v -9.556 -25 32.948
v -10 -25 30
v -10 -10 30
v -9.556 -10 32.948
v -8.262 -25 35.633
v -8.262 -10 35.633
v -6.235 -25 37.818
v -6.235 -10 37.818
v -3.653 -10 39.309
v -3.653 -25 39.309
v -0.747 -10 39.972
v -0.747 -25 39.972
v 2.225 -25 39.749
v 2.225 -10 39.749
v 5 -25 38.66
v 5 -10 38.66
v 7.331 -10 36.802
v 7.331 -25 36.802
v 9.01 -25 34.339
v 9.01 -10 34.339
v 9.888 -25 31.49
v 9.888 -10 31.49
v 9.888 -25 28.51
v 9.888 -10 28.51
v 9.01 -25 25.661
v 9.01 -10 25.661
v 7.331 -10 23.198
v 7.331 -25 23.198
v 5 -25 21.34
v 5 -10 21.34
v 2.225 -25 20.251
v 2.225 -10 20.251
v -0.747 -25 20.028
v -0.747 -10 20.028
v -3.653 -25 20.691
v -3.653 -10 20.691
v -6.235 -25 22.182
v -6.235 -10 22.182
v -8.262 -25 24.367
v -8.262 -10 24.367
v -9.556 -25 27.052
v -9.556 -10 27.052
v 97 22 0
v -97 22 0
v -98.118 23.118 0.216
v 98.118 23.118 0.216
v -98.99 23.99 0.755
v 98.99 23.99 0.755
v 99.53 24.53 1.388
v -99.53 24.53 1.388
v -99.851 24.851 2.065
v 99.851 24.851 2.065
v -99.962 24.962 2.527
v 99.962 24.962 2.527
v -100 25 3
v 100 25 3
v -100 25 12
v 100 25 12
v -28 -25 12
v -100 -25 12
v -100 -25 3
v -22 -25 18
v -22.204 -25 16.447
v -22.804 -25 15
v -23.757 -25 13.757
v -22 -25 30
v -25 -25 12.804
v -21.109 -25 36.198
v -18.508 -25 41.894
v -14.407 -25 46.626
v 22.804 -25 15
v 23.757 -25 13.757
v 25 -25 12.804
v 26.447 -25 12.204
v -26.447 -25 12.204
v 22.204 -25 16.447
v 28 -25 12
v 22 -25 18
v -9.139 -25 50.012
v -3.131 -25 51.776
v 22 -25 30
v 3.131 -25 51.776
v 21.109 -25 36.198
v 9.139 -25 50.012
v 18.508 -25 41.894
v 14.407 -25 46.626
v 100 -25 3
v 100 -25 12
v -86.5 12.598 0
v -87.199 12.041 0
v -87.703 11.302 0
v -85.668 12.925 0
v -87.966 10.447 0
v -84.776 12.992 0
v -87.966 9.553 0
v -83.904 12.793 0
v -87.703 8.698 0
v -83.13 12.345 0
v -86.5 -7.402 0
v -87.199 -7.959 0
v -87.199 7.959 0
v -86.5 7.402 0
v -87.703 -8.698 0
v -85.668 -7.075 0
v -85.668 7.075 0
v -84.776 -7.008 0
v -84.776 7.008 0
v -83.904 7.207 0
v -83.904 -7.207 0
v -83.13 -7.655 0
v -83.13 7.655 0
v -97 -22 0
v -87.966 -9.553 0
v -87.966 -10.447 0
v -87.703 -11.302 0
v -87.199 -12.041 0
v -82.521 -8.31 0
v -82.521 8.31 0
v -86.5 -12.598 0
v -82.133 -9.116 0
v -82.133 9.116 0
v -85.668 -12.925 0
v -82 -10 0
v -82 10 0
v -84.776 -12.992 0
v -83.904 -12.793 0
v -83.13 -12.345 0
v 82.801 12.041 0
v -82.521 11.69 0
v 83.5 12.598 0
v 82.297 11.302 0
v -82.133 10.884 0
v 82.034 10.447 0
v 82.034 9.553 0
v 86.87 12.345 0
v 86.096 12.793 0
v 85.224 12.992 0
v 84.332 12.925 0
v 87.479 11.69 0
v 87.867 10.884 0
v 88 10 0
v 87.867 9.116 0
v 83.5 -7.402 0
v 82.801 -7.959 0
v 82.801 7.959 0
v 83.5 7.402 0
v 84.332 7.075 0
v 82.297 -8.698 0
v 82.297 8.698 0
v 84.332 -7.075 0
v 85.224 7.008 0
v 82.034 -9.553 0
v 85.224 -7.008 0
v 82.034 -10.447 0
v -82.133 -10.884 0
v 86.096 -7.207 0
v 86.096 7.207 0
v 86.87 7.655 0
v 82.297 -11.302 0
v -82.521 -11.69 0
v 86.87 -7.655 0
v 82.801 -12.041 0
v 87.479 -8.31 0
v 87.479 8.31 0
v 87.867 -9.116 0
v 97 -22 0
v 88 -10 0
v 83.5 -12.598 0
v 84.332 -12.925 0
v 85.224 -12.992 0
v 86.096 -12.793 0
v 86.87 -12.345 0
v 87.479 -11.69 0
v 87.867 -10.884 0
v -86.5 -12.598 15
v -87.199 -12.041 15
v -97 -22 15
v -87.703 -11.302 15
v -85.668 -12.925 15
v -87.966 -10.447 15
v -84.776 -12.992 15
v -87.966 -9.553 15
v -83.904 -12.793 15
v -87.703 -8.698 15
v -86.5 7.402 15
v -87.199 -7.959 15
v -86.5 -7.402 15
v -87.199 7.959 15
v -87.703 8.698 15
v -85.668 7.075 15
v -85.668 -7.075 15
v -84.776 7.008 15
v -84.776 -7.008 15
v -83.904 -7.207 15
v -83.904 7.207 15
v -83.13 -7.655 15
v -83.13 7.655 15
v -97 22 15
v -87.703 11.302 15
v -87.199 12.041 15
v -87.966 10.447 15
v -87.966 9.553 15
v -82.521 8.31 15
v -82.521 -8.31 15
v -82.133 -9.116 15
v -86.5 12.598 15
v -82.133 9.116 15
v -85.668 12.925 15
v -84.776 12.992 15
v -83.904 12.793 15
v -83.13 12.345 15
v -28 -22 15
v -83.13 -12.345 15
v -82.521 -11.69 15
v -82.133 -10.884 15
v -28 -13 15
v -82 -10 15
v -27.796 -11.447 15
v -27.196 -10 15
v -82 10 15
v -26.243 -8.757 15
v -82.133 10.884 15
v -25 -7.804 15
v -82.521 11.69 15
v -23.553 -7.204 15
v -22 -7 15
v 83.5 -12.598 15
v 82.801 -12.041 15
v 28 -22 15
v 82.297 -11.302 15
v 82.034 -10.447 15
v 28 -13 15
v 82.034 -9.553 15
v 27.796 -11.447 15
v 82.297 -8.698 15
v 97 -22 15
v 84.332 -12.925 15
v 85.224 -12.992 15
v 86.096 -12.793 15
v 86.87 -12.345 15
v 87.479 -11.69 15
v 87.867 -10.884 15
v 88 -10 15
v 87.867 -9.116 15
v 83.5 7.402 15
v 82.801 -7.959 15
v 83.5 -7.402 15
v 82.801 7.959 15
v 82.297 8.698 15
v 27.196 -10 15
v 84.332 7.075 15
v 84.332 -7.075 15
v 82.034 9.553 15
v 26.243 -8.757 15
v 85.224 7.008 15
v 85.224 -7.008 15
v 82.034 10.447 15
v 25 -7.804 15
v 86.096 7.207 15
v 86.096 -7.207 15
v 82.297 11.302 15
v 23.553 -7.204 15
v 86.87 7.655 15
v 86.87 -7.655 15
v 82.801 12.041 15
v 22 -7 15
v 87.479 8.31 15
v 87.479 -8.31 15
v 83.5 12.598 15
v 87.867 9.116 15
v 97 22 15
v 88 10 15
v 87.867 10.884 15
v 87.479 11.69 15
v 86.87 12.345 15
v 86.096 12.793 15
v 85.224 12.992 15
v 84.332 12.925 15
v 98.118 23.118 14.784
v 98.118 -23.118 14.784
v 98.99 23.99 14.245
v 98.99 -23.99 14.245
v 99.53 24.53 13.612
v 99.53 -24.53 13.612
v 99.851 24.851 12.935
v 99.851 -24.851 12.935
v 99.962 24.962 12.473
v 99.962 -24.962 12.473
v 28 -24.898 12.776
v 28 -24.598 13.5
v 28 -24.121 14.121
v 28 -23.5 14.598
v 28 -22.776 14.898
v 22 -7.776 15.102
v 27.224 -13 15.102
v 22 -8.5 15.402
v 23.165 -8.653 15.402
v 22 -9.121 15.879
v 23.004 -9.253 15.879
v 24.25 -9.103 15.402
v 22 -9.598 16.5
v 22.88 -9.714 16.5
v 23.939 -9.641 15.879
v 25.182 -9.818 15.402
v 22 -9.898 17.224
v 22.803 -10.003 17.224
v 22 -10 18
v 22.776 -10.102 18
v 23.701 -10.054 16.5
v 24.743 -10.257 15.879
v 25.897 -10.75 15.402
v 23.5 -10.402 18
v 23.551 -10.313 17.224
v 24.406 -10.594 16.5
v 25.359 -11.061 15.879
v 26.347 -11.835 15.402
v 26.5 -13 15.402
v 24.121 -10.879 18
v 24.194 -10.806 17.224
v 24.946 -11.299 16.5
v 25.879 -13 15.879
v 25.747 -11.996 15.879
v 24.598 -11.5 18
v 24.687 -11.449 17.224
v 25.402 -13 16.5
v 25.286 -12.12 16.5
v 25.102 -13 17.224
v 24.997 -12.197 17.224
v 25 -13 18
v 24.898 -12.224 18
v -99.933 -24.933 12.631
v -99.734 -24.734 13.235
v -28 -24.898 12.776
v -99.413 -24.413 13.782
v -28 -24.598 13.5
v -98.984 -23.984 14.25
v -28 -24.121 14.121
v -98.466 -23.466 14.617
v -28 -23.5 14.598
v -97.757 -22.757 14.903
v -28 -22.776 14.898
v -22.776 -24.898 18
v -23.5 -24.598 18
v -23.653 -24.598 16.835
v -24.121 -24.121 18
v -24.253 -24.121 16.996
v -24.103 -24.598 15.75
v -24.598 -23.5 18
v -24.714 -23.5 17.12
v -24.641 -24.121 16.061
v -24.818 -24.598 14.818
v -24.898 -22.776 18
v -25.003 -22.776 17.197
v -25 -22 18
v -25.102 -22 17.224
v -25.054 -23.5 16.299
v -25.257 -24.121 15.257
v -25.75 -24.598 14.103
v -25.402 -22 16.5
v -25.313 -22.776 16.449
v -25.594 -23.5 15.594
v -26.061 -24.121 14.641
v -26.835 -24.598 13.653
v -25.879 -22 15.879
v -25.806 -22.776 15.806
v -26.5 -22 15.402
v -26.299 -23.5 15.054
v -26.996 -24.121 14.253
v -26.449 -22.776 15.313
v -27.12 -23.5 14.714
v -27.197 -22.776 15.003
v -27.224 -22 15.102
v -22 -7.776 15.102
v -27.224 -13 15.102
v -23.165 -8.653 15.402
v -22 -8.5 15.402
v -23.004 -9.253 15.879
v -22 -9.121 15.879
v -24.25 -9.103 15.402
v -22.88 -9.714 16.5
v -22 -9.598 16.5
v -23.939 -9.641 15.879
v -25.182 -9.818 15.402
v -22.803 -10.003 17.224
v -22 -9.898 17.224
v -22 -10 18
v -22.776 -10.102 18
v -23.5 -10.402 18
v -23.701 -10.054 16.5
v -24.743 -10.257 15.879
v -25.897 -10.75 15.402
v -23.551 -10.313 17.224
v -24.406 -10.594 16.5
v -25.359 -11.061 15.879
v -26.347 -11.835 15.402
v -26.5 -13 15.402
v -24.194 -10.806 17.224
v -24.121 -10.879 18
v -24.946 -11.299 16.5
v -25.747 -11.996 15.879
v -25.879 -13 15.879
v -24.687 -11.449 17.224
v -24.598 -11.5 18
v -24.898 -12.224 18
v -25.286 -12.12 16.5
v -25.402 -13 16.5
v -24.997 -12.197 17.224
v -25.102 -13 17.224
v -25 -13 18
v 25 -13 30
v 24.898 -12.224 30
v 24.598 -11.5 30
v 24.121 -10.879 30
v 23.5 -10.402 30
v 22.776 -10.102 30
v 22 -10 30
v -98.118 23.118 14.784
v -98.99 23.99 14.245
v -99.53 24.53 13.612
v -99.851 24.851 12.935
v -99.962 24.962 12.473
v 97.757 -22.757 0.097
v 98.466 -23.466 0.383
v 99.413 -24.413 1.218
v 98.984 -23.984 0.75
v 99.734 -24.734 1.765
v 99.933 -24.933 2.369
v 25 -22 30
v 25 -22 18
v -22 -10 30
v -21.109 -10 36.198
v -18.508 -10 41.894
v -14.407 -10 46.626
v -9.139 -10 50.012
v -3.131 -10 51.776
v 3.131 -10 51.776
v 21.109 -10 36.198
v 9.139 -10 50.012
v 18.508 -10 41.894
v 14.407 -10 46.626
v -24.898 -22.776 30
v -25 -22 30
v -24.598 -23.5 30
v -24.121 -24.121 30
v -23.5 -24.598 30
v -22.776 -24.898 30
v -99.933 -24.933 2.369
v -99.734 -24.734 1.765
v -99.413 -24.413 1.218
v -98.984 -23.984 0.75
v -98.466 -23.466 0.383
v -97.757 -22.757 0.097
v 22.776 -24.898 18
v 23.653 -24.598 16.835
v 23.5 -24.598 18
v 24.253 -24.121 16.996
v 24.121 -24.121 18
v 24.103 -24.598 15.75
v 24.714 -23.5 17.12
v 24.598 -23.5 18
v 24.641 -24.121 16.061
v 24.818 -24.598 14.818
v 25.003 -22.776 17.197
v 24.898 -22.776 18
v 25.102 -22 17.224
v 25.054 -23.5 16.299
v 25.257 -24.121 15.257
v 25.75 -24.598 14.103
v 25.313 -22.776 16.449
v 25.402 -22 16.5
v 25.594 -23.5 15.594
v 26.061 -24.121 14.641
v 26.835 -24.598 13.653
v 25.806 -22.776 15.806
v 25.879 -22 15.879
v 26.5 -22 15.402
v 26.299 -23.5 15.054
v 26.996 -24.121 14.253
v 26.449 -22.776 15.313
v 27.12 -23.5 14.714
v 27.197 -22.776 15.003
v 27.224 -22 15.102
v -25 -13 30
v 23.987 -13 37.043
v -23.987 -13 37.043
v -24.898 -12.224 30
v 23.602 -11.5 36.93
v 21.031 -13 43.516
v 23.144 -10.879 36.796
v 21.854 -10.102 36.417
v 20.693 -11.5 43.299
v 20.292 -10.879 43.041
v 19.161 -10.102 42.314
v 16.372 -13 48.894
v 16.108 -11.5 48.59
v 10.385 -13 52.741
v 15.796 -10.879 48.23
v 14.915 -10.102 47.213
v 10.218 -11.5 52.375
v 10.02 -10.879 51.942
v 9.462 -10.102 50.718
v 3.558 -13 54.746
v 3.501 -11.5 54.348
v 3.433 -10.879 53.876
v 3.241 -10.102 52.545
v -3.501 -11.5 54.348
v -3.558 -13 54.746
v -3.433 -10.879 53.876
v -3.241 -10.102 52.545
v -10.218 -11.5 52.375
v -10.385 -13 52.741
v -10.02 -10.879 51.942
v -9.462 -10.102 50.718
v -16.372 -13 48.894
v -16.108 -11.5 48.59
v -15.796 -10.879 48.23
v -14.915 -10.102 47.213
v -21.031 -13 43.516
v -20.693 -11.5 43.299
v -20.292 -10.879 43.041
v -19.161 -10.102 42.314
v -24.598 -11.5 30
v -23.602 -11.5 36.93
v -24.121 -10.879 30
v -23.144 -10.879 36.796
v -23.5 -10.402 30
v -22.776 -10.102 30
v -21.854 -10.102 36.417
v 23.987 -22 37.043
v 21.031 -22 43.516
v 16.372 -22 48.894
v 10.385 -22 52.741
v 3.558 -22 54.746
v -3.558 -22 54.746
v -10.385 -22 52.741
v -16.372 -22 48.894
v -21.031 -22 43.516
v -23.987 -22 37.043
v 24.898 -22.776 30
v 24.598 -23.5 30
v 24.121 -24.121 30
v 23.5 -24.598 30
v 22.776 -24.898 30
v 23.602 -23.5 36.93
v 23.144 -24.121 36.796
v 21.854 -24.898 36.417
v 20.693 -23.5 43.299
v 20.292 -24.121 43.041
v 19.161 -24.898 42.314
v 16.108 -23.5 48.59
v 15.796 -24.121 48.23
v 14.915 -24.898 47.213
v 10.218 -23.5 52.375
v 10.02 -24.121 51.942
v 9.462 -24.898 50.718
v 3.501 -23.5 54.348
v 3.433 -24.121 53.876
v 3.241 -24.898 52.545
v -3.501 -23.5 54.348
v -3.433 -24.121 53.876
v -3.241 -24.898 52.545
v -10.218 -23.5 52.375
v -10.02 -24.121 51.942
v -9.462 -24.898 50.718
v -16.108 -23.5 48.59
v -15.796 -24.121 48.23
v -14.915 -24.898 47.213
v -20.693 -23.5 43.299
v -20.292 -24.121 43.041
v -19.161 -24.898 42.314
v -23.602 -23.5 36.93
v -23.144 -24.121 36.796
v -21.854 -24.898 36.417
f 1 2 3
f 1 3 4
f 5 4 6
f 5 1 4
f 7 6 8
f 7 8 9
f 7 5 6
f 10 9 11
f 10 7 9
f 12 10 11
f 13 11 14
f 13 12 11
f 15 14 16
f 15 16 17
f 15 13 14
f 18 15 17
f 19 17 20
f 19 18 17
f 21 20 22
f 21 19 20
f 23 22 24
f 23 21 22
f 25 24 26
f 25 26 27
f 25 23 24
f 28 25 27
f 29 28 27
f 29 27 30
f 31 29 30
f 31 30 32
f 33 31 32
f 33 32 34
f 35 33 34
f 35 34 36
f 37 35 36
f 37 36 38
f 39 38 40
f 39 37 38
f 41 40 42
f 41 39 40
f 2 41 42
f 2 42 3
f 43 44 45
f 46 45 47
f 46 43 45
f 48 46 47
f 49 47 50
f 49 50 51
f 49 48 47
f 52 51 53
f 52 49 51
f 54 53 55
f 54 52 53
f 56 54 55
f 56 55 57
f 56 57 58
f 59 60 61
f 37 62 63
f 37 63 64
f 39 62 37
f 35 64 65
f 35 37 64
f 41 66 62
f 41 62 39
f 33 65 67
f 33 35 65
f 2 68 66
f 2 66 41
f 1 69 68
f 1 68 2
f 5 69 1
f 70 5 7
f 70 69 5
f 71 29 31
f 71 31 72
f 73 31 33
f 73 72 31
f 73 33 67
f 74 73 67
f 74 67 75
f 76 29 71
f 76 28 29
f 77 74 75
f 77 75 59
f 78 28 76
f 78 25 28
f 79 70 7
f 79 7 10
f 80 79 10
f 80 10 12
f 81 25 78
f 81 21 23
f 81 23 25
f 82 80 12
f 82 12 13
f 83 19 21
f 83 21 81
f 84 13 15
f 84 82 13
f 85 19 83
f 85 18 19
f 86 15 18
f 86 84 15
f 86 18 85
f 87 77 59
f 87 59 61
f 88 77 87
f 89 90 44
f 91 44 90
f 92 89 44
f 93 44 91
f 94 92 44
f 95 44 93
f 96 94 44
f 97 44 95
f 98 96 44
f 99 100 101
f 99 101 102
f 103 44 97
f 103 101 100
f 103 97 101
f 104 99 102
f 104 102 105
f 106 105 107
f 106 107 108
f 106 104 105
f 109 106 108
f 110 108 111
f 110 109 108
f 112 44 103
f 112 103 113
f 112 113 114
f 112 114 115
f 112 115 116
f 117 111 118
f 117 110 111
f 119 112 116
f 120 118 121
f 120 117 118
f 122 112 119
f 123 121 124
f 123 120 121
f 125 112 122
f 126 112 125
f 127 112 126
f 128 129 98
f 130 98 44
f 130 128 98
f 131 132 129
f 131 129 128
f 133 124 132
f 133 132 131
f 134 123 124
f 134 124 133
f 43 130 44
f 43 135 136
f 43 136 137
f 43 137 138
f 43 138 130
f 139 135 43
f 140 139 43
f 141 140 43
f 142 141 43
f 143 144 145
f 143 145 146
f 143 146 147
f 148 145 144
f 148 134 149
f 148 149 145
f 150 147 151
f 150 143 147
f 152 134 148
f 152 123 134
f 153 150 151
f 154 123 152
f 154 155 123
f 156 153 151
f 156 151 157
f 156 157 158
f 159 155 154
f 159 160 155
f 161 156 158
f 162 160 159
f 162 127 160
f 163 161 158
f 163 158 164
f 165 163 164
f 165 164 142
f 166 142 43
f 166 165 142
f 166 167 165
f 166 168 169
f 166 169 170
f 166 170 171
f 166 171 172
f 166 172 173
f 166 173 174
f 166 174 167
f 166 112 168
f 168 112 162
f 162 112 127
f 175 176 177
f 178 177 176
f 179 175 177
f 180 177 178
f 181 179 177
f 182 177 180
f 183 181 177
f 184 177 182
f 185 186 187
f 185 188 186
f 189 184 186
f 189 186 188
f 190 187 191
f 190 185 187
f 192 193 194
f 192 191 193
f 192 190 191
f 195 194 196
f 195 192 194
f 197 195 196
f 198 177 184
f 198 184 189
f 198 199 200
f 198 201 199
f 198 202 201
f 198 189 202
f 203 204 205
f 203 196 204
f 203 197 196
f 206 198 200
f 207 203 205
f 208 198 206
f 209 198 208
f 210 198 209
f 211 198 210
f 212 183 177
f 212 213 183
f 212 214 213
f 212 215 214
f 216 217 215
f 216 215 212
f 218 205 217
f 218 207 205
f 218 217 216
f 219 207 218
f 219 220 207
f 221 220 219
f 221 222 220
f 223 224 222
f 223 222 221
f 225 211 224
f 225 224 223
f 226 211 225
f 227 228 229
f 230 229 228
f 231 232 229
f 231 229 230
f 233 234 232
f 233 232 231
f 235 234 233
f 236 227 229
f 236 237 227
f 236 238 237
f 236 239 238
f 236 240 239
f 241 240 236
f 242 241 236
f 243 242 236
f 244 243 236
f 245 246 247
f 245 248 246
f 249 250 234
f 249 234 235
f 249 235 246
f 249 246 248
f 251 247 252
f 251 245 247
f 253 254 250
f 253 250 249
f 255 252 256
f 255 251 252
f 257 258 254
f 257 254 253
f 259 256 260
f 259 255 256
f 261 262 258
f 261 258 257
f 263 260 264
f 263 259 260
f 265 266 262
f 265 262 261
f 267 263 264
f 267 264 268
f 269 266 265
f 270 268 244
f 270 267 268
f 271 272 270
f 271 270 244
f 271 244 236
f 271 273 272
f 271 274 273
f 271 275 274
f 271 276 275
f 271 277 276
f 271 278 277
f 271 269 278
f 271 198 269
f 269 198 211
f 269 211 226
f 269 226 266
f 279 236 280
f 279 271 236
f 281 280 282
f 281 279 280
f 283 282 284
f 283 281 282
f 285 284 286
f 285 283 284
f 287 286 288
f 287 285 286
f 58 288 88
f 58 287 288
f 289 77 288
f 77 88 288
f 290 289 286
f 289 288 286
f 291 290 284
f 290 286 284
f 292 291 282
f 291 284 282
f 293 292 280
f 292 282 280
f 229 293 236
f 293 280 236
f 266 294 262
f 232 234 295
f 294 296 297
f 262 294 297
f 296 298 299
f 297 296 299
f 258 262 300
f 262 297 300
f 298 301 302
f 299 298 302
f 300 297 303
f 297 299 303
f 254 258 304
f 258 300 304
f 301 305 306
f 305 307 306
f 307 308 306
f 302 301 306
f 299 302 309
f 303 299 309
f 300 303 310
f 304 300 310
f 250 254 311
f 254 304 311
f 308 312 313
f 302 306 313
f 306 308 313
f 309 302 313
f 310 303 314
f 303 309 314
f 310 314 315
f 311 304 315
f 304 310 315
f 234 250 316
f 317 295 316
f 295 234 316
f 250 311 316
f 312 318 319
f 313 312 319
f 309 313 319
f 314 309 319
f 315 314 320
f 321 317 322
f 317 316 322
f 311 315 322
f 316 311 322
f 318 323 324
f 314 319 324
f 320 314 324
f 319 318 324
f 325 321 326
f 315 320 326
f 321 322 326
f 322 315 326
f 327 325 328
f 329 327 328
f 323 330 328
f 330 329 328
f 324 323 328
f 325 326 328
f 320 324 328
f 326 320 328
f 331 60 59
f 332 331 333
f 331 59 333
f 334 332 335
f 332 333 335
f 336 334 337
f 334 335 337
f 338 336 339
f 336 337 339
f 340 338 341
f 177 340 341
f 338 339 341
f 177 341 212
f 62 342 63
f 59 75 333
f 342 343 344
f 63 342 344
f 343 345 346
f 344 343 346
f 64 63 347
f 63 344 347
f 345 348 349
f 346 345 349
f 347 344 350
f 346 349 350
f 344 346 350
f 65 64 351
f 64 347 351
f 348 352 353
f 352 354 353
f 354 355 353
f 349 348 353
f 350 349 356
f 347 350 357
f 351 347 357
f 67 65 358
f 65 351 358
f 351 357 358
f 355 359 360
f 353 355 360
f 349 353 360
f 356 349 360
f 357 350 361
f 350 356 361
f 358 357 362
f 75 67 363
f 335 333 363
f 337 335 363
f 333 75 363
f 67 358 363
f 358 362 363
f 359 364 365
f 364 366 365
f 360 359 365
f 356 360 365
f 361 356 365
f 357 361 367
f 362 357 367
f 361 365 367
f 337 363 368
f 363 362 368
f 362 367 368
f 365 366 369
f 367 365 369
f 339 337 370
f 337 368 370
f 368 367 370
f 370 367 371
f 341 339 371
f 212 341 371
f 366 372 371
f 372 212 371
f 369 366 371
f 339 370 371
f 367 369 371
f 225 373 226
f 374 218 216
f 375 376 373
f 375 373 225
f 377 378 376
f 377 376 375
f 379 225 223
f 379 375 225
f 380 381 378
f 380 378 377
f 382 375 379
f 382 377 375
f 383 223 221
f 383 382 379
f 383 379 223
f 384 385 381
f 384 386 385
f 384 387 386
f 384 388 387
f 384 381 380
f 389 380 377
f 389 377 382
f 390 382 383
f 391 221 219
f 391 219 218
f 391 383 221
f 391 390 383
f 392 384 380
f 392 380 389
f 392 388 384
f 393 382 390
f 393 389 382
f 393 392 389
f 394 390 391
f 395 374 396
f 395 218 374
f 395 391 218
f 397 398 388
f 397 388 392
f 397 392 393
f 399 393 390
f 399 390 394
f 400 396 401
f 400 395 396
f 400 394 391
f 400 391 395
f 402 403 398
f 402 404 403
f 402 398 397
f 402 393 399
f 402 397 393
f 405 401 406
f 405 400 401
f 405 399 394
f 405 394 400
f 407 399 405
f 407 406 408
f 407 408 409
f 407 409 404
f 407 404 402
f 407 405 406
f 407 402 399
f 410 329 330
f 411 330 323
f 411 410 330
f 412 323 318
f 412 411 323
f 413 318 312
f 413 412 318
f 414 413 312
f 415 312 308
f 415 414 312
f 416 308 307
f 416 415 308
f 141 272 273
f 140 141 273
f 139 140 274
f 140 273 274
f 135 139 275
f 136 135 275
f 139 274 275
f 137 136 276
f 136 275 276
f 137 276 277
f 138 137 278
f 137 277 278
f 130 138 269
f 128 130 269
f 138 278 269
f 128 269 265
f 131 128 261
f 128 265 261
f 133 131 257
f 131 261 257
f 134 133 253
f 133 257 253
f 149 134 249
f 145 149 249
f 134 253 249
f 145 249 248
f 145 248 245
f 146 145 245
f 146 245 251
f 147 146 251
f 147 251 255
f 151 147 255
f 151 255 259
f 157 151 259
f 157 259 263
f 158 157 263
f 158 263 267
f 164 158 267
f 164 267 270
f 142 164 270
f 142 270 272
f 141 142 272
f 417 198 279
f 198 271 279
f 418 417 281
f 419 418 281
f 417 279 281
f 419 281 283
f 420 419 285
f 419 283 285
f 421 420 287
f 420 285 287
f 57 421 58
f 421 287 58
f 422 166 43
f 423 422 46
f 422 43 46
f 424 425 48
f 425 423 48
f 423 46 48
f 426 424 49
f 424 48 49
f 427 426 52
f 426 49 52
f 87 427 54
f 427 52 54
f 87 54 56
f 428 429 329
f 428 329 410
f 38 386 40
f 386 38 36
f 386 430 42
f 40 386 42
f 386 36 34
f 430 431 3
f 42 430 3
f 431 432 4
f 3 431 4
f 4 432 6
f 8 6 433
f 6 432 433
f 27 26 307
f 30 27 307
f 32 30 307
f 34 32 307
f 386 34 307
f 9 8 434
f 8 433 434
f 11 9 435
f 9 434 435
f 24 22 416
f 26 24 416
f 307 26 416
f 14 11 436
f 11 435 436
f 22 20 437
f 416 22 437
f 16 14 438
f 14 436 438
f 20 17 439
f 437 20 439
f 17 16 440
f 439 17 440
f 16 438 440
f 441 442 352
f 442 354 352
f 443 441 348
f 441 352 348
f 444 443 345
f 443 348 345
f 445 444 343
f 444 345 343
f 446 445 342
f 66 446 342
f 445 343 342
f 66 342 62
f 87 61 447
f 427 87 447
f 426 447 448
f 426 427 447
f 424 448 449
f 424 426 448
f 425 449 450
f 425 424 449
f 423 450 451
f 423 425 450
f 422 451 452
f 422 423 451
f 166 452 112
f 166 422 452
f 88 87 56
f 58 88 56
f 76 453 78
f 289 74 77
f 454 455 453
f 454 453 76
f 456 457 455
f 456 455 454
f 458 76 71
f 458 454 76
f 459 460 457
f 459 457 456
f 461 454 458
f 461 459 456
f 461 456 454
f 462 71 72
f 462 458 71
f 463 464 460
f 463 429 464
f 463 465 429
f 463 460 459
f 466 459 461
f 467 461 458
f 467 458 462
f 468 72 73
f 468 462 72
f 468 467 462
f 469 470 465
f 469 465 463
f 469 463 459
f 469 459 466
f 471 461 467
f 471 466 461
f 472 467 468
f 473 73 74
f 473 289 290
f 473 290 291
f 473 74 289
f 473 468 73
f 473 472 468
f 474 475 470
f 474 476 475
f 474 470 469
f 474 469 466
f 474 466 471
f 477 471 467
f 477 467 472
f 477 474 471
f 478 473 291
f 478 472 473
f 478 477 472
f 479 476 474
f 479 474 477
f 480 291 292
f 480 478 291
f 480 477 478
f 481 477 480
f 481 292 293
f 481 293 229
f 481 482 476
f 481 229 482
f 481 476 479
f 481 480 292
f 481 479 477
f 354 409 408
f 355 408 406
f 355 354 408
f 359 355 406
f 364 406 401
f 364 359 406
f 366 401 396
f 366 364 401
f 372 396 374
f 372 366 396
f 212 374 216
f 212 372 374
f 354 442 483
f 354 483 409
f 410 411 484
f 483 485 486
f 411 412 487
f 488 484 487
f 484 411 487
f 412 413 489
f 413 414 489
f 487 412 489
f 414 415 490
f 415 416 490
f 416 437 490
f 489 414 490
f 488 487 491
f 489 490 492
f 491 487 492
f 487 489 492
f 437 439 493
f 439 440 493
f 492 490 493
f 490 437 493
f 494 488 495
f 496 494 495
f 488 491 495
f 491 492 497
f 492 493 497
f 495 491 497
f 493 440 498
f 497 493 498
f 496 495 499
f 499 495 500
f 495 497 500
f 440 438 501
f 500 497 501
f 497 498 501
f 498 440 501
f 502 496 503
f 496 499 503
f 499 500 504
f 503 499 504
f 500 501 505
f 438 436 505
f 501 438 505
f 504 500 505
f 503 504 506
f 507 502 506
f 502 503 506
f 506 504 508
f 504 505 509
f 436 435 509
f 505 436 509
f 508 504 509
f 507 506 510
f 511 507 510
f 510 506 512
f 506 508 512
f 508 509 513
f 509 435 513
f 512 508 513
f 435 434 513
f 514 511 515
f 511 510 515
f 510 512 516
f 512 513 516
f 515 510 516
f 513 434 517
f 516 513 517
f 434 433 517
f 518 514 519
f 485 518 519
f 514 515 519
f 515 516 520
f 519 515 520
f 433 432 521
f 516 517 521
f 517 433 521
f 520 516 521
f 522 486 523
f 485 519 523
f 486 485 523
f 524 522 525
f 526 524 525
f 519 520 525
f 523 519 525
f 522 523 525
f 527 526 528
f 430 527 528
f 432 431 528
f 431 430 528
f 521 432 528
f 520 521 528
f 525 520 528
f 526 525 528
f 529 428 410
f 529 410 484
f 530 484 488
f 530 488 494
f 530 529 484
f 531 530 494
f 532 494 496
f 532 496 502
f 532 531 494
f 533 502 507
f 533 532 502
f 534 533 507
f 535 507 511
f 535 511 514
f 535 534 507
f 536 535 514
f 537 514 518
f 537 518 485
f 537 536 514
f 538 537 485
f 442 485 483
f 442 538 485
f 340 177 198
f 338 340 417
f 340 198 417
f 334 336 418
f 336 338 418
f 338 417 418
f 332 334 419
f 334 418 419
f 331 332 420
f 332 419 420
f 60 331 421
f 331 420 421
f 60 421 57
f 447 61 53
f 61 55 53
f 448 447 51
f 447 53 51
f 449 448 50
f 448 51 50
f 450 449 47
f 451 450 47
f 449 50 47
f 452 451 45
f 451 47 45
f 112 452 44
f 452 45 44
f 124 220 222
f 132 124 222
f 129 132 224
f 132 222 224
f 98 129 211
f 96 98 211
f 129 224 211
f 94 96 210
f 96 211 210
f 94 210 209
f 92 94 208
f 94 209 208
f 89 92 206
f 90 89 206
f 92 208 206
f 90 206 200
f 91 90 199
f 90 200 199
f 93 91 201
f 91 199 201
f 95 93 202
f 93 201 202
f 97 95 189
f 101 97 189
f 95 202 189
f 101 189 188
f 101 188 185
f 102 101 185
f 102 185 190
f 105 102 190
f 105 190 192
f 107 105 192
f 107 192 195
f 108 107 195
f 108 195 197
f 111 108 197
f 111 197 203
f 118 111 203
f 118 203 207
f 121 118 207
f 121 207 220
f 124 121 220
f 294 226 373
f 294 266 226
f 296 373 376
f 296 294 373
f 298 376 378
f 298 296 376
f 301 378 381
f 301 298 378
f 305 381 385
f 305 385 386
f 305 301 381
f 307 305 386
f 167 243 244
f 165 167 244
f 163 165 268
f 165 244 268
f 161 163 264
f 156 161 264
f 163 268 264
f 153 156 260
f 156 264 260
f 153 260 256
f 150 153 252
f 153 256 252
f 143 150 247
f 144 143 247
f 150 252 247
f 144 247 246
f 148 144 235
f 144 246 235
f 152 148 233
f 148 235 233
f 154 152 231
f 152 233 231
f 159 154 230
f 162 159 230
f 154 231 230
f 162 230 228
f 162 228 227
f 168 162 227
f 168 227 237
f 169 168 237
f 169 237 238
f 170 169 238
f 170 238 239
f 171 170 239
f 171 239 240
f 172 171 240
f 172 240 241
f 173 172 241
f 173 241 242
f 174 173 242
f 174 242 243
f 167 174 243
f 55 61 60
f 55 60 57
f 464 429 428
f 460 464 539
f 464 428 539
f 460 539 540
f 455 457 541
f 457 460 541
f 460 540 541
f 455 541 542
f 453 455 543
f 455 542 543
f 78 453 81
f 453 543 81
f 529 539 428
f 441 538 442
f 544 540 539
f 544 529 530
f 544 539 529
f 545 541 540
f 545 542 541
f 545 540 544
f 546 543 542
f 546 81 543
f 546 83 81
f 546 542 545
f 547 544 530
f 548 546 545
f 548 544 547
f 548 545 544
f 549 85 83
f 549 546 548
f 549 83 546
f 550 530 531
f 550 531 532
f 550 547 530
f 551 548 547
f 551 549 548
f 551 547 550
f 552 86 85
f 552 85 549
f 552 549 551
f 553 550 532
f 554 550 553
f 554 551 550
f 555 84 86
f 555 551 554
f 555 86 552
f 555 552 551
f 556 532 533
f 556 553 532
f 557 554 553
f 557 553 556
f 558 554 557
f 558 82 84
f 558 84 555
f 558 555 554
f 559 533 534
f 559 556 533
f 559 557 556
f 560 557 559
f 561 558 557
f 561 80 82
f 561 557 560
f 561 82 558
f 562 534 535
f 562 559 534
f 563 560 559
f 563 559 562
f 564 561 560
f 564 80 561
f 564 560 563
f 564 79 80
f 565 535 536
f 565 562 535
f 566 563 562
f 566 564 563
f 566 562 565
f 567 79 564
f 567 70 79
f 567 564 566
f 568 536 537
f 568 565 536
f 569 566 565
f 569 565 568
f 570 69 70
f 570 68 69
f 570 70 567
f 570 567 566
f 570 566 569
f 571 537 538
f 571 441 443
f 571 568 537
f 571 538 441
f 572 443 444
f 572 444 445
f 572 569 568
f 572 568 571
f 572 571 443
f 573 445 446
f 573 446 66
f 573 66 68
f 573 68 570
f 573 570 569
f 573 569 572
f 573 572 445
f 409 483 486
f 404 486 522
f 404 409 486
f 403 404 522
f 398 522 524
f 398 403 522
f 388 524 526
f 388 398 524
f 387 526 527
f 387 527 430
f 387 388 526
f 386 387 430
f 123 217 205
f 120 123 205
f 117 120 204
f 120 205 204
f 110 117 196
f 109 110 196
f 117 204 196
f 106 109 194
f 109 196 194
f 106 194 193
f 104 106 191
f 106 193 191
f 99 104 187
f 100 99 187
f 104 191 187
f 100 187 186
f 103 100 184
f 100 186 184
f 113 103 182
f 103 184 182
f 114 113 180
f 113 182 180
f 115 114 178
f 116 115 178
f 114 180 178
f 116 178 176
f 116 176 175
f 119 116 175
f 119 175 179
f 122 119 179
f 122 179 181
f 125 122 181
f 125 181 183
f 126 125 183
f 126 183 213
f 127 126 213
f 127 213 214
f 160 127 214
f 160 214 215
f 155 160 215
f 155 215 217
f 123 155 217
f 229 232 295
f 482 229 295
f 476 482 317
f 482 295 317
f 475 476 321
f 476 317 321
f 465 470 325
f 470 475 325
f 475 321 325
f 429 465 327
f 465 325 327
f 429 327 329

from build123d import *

# Parameters (mm, degrees)
F0_W     = 200
F0_H     = 50
F1_DEPTH = 15
F3_DEPTH = 15
F4_R     = 3
F5_DEPTH = 15.001
F6_R     = 3


with BuildPart() as f1:
    # F0 (on Top) → F1 (new body)
    with BuildSketch(Plane.XY):
        Rectangle(F0_W, F0_H)
    extrude(amount=F1_DEPTH)

    # F2 (on face) → F3 (join)
    with BuildSketch(Plane.XZ.offset(25)):
        with BuildLine():
            Line((25, 15), (20, 15))
            ThreePointArc((20, 15), (0, 5), (-20, 15))
            Line((-20, 15), (-25, 15))
            Line((-25, 15), (-25, 0))
            Line((-25, 0), (25, 0))
            Line((25, 0), (25, 15))
        make_face()
        with BuildLine():
            ThreePointArc((-20, 15), (-23.7170824513, 22.0943058496), (-25, 30))
            Line((-25, 30), (-25, 15))
            Line((-25, 15), (-20, 15))
        make_face()
        with BuildLine():
            Line((25, 15), (25, 30))
            ThreePointArc((25, 30), (23.7170824513, 22.0943058496), (20, 15))
            Line((20, 15), (25, 15))
        make_face()
        with BuildLine():
            ThreePointArc((-20, 15), (0, 5), (20, 15))
            Line((20, 15), (-20, 15))
        make_face()
        with BuildLine():
            ThreePointArc((20, 15), (23.7170824513, 22.0943058496), (25, 30))
            Line((25, 30), (10, 30))
            ThreePointArc((10, 30), (0, 20), (-10, 30))
            Line((-10, 30), (-25, 30))
            ThreePointArc((-25, 30), (-23.7170824513, 22.0943058496), (-20, 15))
            Line((-20, 15), (20, 15))
        make_face()
        with BuildLine():
            Line((10, 30), (25, 30))
            ThreePointArc((25, 30), (0, 55), (-25, 30))
            Line((-25, 30), (-10, 30))
            ThreePointArc((-10, 30), (0, 40), (10, 30))
        make_face()
    extrude(amount=-F3_DEPTH)

    # F4 (on face) → F5 (cut, through all)
    with BuildSketch(Plane.XY.offset(15)):
        with Locations((-85, 10)):
            Circle(F4_R)
        with Locations((-85, -10)):
            Circle(F4_R)
        with Locations((85, 10)):
            Circle(F4_R)
        with Locations((85, -10)):
            Circle(F4_R)
    extrude(amount=-F5_DEPTH, mode=Mode.SUBTRACT)

    # F6
    f6_edges = [f1.edges().sort_by_distance(p)[0] for p in [
        (-62.5, -25, 15),
        (-100, 0, 15),
        (0, 25, 15),
        (100, 0, 15),
        (62.5, -25, 15),
        (25, -17.5, 15),
        (-25, -17.5, 15),
        (-25, -10, 22.5),
        (0, -25, 0),
        (100, 0, 0),
        (0, 25, 0),
        (-100, 0, 0),
        (-25, -25, 22.5),
        (0, -25, 55),
        (25, -25, 22.5),
        (0, -10, 15),
        (0, -10, 55),
        (25, -10, 22.5),
    ]]
    fillet(f6_edges, radius=F6_R)


solid = f1.part
